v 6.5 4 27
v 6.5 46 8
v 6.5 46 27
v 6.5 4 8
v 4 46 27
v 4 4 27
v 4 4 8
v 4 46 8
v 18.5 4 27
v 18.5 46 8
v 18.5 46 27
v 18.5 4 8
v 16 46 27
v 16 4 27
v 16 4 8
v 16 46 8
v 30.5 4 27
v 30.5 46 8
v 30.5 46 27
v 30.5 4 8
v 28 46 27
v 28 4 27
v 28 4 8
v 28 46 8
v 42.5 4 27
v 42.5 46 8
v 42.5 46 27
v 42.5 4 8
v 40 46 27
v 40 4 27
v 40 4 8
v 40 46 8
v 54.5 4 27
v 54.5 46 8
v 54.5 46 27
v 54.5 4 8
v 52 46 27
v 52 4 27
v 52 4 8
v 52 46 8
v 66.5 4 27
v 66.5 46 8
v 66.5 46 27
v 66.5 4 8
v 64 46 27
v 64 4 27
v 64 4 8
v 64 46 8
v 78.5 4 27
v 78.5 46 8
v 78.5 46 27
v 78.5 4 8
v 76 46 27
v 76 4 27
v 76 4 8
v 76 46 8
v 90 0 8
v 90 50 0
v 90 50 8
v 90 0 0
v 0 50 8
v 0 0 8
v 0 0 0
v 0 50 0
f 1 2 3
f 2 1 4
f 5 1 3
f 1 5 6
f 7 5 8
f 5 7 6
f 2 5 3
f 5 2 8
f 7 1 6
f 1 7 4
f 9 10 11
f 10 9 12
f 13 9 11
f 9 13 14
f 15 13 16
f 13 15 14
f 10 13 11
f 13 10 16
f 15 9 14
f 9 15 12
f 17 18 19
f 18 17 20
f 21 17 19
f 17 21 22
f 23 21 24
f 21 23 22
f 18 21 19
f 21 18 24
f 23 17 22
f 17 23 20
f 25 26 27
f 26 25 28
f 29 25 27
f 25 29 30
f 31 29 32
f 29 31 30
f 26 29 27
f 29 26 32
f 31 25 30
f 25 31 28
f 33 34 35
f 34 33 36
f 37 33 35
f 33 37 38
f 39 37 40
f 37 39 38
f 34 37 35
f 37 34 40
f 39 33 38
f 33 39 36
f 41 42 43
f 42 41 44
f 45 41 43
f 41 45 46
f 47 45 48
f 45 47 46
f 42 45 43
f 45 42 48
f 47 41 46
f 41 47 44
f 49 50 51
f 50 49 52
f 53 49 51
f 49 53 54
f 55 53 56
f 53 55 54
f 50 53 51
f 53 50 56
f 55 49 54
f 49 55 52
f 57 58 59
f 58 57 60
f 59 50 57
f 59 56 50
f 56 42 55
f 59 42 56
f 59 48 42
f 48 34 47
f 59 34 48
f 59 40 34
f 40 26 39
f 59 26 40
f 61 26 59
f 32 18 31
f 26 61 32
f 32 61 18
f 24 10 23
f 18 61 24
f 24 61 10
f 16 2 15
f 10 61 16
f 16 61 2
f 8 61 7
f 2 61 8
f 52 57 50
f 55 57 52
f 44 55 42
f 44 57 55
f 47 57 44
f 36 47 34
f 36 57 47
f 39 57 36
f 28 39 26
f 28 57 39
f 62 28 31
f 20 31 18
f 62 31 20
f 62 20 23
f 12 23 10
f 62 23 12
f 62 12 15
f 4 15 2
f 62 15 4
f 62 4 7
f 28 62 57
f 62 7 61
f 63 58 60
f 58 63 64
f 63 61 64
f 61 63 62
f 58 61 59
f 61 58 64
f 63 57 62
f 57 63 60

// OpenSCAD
$fn = 32;

// ----------------------------------------------------------------------
// Heatsink: uniform fin block
// ----------------------------------------------------------------------

// --- parameters (mm) ---
base_l = 90;              // base length, X
base_w = 50;              // base width, Y
base_t = 8;               // base plate thickness
fin_h = 20;               // fin height above the base
fin_t = 2.5;              // fin thickness
edge = 4;                 // margin from the base ends
pitch = 12;               // fin pitch

n_fins = floor((base_l - 2 * edge - fin_t) / pitch) + 1;  // fin count
total_h = base_t + fin_h - 1;  // overall height

union() {
  cube([base_l, base_w, base_t]);
  for (i = [0 : n_fins - 1])
    translate([edge + i * pitch, edge, base_t - 1])
      cube([fin_t, base_w - 2 * edge, fin_h]);
}
